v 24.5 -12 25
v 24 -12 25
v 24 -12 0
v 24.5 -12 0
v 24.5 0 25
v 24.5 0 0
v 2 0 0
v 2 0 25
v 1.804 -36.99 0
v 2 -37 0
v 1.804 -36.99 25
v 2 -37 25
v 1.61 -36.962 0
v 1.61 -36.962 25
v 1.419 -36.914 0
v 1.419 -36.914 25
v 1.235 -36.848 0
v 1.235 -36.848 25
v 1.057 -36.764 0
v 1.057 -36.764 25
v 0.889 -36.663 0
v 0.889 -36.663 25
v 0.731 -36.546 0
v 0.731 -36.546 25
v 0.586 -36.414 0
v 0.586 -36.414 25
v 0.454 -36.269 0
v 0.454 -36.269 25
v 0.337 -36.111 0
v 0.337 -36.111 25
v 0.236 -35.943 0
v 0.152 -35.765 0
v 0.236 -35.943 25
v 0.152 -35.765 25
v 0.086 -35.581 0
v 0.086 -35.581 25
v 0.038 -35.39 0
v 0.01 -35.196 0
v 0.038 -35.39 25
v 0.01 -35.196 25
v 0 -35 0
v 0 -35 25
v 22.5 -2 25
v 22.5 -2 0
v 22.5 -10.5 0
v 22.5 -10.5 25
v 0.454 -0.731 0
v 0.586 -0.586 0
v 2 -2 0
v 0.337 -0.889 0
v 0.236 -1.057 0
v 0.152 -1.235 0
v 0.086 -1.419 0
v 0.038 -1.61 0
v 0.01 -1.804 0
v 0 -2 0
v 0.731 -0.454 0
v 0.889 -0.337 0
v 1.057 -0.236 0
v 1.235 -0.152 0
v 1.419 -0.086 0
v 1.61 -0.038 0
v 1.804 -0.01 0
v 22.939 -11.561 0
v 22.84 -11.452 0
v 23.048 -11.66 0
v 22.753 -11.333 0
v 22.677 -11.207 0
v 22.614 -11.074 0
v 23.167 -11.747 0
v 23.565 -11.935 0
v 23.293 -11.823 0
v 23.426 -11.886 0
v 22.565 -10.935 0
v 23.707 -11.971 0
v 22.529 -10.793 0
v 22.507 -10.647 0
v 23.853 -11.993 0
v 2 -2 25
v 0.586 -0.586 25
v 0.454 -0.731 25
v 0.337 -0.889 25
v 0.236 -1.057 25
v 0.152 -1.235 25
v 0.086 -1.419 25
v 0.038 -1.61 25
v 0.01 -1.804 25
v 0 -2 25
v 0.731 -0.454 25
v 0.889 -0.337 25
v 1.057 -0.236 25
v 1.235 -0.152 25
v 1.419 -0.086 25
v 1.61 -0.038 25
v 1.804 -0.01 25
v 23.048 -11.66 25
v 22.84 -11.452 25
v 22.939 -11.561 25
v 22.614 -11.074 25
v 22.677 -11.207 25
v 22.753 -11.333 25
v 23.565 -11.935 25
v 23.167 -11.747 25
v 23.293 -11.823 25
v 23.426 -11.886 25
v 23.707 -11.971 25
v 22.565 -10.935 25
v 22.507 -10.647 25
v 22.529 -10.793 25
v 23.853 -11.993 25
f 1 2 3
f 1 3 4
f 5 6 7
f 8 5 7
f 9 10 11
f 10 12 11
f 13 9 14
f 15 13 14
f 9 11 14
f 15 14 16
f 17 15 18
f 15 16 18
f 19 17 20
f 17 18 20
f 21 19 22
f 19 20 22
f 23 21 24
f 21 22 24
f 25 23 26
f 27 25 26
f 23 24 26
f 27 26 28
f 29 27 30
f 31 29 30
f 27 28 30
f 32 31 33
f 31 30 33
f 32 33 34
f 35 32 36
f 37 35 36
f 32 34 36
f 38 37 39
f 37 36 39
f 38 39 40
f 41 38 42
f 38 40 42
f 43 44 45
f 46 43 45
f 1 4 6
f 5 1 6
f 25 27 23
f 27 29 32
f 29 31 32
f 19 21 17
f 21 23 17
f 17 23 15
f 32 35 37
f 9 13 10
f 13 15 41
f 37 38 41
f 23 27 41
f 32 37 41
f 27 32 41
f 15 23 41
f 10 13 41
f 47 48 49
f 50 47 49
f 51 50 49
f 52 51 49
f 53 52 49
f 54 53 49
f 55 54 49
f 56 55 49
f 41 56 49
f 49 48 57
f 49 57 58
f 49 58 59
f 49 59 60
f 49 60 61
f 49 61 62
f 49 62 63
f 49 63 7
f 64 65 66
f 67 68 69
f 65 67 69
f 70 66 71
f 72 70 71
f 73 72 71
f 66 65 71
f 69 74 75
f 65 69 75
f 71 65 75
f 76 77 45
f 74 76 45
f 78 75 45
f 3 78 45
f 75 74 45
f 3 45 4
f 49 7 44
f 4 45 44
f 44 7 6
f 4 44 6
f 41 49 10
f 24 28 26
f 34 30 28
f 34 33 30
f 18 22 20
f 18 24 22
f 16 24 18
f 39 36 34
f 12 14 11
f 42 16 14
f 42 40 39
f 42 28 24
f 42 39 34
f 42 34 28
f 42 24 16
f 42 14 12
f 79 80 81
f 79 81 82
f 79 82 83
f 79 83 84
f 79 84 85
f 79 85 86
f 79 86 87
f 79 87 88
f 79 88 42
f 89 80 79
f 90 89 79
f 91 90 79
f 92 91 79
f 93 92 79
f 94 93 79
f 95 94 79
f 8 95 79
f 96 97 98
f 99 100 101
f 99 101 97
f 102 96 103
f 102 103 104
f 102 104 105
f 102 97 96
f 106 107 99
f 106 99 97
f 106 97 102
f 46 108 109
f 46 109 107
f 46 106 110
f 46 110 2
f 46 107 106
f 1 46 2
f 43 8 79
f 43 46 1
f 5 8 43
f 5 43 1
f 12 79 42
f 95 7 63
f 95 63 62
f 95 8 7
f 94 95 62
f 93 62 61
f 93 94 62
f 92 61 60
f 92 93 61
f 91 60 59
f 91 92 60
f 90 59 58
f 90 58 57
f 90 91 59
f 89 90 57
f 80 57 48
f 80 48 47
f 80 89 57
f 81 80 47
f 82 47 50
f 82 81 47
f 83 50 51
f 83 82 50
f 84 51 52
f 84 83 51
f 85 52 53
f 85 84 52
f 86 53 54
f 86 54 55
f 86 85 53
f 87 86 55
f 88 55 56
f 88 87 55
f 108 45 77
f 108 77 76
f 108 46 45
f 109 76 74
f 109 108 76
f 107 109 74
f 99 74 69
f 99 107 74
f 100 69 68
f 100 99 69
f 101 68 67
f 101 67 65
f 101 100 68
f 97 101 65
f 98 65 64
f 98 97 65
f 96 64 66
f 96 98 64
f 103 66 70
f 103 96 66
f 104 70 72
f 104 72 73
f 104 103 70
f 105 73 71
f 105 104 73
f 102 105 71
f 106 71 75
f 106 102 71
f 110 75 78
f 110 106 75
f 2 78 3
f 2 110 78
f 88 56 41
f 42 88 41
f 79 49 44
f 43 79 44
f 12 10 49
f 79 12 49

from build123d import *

# Parameters (mm, degrees)
F1_DEPTH = 25
F2_R     = 1.5
F3_R     = 1.99999


# Not quite as in the source:
# - a fillet or chamfer is up to 0.001 mm smaller than in the source, because OpenCascade refuses the exact size


with BuildPart() as f1:
    # F0 (on Top) → F1 (new body)
    with BuildSketch(Plane.XY):
        Polygon((24.5, 0), (0, 0), (0, -37), (2, -37), (2, -2), (22.5, -2), (22.5, -12), (24.5, -12), align=None)
    extrude(amount=F1_DEPTH)

    # F2
    f2_edges = [f1.edges().sort_by_distance(p)[0] for p in [
        (22.5, -12, 12.5),
    ]]
    fillet(f2_edges, radius=F2_R)

    # F3 (radius 2 in the source; OpenCascade refuses exactly that, so slightly less here)
    f3_edges = [f1.edges().sort_by_distance(p)[0] for p in [
        (0, 0, 12.5),
        (0, -37, 12.5),
    ]]
    fillet(f3_edges, radius=F3_R)


solid = f1.part
